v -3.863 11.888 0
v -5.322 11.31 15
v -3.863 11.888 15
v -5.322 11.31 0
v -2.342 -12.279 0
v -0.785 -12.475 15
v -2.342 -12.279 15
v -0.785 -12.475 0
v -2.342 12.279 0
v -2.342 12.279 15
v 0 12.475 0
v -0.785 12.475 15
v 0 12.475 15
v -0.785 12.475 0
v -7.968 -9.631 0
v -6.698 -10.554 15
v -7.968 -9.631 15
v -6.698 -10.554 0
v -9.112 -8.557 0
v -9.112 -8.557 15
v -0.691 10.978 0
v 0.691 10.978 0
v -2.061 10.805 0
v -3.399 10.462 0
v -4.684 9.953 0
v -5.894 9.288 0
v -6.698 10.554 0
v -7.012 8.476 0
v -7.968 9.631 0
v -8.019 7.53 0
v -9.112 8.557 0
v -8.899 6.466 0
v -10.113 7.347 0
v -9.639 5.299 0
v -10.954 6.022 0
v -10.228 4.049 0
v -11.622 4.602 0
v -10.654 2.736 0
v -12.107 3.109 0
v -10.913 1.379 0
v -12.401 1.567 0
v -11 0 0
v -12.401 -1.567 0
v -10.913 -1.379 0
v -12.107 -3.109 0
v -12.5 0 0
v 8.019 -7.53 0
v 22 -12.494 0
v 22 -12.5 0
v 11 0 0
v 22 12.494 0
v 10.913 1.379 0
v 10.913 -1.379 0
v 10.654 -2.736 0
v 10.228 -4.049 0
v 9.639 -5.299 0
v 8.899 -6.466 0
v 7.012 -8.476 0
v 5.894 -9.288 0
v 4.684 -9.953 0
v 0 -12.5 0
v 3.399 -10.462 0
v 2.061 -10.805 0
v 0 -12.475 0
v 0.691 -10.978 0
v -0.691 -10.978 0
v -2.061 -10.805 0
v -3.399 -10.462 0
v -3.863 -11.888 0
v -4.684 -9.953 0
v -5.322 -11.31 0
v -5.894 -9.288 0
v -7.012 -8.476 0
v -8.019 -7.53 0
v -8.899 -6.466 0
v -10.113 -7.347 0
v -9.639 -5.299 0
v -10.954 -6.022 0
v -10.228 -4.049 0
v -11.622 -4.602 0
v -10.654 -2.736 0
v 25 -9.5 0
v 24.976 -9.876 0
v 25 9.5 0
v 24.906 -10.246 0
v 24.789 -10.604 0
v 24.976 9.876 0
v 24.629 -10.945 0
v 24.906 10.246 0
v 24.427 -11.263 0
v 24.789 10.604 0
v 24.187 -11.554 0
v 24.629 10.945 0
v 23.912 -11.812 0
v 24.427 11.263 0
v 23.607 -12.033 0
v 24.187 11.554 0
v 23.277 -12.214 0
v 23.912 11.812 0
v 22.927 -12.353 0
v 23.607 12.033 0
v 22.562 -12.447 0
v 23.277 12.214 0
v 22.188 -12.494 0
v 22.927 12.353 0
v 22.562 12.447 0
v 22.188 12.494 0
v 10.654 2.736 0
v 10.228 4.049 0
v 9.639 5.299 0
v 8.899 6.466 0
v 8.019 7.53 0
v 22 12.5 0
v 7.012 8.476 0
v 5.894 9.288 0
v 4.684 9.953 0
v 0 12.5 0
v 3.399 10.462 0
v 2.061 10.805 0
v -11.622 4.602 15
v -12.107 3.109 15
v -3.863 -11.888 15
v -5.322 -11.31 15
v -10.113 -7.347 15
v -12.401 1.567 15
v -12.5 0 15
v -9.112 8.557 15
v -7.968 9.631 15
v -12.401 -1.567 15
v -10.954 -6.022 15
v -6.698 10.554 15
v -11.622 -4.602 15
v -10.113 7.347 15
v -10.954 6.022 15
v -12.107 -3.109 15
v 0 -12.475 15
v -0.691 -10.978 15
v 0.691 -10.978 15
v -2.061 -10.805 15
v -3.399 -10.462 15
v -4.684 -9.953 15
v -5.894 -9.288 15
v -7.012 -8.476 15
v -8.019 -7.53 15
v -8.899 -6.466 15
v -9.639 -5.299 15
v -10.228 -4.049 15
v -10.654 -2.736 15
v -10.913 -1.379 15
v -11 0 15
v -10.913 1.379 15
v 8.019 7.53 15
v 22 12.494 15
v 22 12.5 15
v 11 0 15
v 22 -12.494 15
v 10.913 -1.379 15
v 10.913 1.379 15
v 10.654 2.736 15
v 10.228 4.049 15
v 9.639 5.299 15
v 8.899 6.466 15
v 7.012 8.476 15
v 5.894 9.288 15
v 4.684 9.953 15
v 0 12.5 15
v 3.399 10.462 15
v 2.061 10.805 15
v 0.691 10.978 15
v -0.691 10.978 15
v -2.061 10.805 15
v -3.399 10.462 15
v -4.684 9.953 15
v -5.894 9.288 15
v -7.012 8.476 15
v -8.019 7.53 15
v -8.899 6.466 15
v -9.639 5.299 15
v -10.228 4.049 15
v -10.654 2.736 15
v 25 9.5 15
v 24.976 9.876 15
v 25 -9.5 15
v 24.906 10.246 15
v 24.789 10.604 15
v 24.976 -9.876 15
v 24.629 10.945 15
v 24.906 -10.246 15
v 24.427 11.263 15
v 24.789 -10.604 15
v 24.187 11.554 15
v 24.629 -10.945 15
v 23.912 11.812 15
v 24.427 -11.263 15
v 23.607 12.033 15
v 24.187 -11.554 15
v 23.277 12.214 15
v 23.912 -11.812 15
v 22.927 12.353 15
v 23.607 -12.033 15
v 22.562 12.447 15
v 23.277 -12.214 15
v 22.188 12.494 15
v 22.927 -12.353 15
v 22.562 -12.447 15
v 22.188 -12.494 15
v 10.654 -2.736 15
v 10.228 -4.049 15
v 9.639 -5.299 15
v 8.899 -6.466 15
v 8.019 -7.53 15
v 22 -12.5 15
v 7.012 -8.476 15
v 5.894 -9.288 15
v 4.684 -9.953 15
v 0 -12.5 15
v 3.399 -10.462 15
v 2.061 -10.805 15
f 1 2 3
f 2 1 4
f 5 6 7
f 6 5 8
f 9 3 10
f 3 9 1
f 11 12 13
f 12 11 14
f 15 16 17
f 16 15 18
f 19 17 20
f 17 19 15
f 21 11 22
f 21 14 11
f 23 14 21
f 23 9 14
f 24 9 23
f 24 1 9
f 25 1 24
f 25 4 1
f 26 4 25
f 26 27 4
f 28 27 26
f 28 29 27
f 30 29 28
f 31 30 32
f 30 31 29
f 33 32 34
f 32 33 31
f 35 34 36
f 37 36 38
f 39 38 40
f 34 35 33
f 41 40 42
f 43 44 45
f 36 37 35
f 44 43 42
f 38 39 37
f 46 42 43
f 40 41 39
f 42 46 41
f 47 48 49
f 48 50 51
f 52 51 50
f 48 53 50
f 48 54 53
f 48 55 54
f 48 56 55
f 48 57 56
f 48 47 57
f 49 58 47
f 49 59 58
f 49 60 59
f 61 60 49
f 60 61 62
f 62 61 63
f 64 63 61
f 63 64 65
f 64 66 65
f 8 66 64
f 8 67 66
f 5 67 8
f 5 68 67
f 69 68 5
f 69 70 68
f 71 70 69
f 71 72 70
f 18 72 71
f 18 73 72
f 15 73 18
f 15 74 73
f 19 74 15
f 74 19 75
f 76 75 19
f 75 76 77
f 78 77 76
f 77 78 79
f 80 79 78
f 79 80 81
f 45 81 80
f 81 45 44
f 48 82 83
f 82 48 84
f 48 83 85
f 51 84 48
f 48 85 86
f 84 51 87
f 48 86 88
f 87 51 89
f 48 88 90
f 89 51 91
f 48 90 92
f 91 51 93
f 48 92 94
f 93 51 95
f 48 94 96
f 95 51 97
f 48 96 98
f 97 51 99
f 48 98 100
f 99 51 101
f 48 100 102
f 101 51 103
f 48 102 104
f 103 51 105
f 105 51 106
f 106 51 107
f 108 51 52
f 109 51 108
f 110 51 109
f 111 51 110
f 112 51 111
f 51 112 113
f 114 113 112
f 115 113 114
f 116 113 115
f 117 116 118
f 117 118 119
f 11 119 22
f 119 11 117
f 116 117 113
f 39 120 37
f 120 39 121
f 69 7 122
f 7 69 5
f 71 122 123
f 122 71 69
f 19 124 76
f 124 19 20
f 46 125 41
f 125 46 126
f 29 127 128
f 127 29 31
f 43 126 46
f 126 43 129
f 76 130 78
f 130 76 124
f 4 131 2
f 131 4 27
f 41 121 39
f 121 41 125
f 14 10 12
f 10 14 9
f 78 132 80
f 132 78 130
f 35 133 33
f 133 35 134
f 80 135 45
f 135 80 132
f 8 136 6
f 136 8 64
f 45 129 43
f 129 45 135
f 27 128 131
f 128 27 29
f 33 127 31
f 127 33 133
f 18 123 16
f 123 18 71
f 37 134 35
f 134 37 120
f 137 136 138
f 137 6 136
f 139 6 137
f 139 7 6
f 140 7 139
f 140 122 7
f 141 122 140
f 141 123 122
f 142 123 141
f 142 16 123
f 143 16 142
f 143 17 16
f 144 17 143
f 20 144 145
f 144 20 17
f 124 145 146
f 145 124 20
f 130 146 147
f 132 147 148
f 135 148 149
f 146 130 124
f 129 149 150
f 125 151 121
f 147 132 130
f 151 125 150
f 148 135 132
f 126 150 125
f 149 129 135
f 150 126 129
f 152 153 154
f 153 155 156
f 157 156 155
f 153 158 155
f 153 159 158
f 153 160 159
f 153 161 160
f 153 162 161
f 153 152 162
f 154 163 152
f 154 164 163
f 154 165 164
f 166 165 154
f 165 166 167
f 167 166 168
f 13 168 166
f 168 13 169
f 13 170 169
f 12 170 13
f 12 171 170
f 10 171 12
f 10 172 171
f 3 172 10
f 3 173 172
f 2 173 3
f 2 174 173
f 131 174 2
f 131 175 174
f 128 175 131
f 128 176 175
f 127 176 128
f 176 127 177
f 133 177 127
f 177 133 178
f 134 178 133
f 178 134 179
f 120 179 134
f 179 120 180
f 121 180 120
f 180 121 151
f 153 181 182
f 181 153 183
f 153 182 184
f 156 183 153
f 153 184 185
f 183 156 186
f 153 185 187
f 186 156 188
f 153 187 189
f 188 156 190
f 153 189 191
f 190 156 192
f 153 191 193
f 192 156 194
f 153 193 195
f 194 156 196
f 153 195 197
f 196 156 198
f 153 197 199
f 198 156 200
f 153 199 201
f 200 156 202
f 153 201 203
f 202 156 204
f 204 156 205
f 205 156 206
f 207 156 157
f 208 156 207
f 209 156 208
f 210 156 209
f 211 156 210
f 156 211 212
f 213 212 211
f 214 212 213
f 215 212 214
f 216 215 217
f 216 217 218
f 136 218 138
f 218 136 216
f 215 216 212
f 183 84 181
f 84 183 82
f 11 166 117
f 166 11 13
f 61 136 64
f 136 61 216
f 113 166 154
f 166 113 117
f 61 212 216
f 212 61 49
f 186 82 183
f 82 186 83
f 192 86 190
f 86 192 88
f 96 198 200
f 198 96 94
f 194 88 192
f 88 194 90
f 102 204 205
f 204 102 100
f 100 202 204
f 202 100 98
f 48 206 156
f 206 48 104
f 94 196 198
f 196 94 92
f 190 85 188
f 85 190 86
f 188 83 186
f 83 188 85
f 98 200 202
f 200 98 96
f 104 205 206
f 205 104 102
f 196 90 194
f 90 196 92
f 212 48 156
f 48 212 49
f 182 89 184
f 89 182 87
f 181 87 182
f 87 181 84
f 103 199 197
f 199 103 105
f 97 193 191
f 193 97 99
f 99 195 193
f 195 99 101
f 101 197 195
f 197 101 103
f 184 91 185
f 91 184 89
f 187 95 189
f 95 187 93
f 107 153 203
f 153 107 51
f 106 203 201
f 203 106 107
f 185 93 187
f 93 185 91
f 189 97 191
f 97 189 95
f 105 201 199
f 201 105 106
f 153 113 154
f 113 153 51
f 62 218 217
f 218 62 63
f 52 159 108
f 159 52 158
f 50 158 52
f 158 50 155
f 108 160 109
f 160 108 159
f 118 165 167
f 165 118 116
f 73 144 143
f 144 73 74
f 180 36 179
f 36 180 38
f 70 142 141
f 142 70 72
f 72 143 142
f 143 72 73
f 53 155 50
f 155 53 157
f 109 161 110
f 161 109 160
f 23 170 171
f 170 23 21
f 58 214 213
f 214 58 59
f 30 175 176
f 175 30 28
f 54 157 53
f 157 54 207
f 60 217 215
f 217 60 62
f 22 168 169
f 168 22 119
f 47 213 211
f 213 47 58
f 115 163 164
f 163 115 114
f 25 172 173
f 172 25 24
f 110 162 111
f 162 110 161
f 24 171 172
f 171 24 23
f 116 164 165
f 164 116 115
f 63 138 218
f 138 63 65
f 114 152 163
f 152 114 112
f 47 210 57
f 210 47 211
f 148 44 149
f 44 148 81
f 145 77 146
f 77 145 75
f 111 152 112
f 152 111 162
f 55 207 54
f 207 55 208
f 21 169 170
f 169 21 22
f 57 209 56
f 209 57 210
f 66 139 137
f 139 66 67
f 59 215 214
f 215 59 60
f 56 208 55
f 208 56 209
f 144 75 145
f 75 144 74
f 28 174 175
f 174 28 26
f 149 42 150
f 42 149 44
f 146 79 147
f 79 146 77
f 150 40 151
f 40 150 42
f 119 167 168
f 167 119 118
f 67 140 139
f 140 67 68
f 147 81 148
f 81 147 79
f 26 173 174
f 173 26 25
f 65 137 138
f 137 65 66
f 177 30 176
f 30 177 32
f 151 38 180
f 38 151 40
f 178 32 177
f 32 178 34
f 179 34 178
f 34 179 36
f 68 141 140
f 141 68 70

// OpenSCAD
//Body height (mm).
Body_height = 15;
//Diameter for the door handle hole (mm).
Hole_diameter = 22;
//Length of body (mm). Measured from the center of the hole.
Body_length = 25;
//Radius of the corners (mm).
Fillet_radius = 3;
//Material thickness (mm).
Thickness = 3;
//Width of the body (mm).
Body_width = Hole_diameter+Thickness;
$fn=50;

difference(){ //Cutting out the hole and Fillet_radiuss  
union(){     
    //The main body, circle and a rectangle.
    cylinder(h=Body_height,d=Body_width);
        translate([0,-(Body_width)/2],0) cube([          Body_length,Hole_diameter+Thickness,Body_height]);
    }
//The hole
#cylinder(h=Body_height,d=Hole_diameter,center=false); 

//Creating radius 1
intersection(){     //Isolate the cutting shape for the corner
difference(){   //Create the shape of the corner
    translate([Body_length-(Fillet_radius*2),-Body_width/2,0])    cube([Fillet_radius*2,Fillet_radius*2,Body_height]);    
    translate([Body_length-Fillet_radius,-(Body_width/2)+Fillet_radius,0])    cylinder(h=Body_height,r=Fillet_radius);    
}
        translate([Body_length-Fillet_radius,-Body_width/2,0      ])    cube([Fillet_radius,Fillet_radius,Body_height]);
}
//Creating radius 2
intersection(){     //Isolate the cutting shape for the corner
difference(){   //Create the shape of the corner
translate([Body_length-(Fillet_radius*2),(Body_width/2)-Fillet_radius*2,0])    cube([Fillet_radius*2,Fillet_radius*2,Body_height]);    
    translate([Body_length-Fillet_radius,(Body_width/2)-Fillet_radius,0])    cylinder(h=Body_height,r=Fillet_radius);    
}
translate([Body_length-Fillet_radius,(Body_width/2)-Fillet_radius,0])    cube([Fillet_radius,Fillet_radius,Body_height]);
}
}
